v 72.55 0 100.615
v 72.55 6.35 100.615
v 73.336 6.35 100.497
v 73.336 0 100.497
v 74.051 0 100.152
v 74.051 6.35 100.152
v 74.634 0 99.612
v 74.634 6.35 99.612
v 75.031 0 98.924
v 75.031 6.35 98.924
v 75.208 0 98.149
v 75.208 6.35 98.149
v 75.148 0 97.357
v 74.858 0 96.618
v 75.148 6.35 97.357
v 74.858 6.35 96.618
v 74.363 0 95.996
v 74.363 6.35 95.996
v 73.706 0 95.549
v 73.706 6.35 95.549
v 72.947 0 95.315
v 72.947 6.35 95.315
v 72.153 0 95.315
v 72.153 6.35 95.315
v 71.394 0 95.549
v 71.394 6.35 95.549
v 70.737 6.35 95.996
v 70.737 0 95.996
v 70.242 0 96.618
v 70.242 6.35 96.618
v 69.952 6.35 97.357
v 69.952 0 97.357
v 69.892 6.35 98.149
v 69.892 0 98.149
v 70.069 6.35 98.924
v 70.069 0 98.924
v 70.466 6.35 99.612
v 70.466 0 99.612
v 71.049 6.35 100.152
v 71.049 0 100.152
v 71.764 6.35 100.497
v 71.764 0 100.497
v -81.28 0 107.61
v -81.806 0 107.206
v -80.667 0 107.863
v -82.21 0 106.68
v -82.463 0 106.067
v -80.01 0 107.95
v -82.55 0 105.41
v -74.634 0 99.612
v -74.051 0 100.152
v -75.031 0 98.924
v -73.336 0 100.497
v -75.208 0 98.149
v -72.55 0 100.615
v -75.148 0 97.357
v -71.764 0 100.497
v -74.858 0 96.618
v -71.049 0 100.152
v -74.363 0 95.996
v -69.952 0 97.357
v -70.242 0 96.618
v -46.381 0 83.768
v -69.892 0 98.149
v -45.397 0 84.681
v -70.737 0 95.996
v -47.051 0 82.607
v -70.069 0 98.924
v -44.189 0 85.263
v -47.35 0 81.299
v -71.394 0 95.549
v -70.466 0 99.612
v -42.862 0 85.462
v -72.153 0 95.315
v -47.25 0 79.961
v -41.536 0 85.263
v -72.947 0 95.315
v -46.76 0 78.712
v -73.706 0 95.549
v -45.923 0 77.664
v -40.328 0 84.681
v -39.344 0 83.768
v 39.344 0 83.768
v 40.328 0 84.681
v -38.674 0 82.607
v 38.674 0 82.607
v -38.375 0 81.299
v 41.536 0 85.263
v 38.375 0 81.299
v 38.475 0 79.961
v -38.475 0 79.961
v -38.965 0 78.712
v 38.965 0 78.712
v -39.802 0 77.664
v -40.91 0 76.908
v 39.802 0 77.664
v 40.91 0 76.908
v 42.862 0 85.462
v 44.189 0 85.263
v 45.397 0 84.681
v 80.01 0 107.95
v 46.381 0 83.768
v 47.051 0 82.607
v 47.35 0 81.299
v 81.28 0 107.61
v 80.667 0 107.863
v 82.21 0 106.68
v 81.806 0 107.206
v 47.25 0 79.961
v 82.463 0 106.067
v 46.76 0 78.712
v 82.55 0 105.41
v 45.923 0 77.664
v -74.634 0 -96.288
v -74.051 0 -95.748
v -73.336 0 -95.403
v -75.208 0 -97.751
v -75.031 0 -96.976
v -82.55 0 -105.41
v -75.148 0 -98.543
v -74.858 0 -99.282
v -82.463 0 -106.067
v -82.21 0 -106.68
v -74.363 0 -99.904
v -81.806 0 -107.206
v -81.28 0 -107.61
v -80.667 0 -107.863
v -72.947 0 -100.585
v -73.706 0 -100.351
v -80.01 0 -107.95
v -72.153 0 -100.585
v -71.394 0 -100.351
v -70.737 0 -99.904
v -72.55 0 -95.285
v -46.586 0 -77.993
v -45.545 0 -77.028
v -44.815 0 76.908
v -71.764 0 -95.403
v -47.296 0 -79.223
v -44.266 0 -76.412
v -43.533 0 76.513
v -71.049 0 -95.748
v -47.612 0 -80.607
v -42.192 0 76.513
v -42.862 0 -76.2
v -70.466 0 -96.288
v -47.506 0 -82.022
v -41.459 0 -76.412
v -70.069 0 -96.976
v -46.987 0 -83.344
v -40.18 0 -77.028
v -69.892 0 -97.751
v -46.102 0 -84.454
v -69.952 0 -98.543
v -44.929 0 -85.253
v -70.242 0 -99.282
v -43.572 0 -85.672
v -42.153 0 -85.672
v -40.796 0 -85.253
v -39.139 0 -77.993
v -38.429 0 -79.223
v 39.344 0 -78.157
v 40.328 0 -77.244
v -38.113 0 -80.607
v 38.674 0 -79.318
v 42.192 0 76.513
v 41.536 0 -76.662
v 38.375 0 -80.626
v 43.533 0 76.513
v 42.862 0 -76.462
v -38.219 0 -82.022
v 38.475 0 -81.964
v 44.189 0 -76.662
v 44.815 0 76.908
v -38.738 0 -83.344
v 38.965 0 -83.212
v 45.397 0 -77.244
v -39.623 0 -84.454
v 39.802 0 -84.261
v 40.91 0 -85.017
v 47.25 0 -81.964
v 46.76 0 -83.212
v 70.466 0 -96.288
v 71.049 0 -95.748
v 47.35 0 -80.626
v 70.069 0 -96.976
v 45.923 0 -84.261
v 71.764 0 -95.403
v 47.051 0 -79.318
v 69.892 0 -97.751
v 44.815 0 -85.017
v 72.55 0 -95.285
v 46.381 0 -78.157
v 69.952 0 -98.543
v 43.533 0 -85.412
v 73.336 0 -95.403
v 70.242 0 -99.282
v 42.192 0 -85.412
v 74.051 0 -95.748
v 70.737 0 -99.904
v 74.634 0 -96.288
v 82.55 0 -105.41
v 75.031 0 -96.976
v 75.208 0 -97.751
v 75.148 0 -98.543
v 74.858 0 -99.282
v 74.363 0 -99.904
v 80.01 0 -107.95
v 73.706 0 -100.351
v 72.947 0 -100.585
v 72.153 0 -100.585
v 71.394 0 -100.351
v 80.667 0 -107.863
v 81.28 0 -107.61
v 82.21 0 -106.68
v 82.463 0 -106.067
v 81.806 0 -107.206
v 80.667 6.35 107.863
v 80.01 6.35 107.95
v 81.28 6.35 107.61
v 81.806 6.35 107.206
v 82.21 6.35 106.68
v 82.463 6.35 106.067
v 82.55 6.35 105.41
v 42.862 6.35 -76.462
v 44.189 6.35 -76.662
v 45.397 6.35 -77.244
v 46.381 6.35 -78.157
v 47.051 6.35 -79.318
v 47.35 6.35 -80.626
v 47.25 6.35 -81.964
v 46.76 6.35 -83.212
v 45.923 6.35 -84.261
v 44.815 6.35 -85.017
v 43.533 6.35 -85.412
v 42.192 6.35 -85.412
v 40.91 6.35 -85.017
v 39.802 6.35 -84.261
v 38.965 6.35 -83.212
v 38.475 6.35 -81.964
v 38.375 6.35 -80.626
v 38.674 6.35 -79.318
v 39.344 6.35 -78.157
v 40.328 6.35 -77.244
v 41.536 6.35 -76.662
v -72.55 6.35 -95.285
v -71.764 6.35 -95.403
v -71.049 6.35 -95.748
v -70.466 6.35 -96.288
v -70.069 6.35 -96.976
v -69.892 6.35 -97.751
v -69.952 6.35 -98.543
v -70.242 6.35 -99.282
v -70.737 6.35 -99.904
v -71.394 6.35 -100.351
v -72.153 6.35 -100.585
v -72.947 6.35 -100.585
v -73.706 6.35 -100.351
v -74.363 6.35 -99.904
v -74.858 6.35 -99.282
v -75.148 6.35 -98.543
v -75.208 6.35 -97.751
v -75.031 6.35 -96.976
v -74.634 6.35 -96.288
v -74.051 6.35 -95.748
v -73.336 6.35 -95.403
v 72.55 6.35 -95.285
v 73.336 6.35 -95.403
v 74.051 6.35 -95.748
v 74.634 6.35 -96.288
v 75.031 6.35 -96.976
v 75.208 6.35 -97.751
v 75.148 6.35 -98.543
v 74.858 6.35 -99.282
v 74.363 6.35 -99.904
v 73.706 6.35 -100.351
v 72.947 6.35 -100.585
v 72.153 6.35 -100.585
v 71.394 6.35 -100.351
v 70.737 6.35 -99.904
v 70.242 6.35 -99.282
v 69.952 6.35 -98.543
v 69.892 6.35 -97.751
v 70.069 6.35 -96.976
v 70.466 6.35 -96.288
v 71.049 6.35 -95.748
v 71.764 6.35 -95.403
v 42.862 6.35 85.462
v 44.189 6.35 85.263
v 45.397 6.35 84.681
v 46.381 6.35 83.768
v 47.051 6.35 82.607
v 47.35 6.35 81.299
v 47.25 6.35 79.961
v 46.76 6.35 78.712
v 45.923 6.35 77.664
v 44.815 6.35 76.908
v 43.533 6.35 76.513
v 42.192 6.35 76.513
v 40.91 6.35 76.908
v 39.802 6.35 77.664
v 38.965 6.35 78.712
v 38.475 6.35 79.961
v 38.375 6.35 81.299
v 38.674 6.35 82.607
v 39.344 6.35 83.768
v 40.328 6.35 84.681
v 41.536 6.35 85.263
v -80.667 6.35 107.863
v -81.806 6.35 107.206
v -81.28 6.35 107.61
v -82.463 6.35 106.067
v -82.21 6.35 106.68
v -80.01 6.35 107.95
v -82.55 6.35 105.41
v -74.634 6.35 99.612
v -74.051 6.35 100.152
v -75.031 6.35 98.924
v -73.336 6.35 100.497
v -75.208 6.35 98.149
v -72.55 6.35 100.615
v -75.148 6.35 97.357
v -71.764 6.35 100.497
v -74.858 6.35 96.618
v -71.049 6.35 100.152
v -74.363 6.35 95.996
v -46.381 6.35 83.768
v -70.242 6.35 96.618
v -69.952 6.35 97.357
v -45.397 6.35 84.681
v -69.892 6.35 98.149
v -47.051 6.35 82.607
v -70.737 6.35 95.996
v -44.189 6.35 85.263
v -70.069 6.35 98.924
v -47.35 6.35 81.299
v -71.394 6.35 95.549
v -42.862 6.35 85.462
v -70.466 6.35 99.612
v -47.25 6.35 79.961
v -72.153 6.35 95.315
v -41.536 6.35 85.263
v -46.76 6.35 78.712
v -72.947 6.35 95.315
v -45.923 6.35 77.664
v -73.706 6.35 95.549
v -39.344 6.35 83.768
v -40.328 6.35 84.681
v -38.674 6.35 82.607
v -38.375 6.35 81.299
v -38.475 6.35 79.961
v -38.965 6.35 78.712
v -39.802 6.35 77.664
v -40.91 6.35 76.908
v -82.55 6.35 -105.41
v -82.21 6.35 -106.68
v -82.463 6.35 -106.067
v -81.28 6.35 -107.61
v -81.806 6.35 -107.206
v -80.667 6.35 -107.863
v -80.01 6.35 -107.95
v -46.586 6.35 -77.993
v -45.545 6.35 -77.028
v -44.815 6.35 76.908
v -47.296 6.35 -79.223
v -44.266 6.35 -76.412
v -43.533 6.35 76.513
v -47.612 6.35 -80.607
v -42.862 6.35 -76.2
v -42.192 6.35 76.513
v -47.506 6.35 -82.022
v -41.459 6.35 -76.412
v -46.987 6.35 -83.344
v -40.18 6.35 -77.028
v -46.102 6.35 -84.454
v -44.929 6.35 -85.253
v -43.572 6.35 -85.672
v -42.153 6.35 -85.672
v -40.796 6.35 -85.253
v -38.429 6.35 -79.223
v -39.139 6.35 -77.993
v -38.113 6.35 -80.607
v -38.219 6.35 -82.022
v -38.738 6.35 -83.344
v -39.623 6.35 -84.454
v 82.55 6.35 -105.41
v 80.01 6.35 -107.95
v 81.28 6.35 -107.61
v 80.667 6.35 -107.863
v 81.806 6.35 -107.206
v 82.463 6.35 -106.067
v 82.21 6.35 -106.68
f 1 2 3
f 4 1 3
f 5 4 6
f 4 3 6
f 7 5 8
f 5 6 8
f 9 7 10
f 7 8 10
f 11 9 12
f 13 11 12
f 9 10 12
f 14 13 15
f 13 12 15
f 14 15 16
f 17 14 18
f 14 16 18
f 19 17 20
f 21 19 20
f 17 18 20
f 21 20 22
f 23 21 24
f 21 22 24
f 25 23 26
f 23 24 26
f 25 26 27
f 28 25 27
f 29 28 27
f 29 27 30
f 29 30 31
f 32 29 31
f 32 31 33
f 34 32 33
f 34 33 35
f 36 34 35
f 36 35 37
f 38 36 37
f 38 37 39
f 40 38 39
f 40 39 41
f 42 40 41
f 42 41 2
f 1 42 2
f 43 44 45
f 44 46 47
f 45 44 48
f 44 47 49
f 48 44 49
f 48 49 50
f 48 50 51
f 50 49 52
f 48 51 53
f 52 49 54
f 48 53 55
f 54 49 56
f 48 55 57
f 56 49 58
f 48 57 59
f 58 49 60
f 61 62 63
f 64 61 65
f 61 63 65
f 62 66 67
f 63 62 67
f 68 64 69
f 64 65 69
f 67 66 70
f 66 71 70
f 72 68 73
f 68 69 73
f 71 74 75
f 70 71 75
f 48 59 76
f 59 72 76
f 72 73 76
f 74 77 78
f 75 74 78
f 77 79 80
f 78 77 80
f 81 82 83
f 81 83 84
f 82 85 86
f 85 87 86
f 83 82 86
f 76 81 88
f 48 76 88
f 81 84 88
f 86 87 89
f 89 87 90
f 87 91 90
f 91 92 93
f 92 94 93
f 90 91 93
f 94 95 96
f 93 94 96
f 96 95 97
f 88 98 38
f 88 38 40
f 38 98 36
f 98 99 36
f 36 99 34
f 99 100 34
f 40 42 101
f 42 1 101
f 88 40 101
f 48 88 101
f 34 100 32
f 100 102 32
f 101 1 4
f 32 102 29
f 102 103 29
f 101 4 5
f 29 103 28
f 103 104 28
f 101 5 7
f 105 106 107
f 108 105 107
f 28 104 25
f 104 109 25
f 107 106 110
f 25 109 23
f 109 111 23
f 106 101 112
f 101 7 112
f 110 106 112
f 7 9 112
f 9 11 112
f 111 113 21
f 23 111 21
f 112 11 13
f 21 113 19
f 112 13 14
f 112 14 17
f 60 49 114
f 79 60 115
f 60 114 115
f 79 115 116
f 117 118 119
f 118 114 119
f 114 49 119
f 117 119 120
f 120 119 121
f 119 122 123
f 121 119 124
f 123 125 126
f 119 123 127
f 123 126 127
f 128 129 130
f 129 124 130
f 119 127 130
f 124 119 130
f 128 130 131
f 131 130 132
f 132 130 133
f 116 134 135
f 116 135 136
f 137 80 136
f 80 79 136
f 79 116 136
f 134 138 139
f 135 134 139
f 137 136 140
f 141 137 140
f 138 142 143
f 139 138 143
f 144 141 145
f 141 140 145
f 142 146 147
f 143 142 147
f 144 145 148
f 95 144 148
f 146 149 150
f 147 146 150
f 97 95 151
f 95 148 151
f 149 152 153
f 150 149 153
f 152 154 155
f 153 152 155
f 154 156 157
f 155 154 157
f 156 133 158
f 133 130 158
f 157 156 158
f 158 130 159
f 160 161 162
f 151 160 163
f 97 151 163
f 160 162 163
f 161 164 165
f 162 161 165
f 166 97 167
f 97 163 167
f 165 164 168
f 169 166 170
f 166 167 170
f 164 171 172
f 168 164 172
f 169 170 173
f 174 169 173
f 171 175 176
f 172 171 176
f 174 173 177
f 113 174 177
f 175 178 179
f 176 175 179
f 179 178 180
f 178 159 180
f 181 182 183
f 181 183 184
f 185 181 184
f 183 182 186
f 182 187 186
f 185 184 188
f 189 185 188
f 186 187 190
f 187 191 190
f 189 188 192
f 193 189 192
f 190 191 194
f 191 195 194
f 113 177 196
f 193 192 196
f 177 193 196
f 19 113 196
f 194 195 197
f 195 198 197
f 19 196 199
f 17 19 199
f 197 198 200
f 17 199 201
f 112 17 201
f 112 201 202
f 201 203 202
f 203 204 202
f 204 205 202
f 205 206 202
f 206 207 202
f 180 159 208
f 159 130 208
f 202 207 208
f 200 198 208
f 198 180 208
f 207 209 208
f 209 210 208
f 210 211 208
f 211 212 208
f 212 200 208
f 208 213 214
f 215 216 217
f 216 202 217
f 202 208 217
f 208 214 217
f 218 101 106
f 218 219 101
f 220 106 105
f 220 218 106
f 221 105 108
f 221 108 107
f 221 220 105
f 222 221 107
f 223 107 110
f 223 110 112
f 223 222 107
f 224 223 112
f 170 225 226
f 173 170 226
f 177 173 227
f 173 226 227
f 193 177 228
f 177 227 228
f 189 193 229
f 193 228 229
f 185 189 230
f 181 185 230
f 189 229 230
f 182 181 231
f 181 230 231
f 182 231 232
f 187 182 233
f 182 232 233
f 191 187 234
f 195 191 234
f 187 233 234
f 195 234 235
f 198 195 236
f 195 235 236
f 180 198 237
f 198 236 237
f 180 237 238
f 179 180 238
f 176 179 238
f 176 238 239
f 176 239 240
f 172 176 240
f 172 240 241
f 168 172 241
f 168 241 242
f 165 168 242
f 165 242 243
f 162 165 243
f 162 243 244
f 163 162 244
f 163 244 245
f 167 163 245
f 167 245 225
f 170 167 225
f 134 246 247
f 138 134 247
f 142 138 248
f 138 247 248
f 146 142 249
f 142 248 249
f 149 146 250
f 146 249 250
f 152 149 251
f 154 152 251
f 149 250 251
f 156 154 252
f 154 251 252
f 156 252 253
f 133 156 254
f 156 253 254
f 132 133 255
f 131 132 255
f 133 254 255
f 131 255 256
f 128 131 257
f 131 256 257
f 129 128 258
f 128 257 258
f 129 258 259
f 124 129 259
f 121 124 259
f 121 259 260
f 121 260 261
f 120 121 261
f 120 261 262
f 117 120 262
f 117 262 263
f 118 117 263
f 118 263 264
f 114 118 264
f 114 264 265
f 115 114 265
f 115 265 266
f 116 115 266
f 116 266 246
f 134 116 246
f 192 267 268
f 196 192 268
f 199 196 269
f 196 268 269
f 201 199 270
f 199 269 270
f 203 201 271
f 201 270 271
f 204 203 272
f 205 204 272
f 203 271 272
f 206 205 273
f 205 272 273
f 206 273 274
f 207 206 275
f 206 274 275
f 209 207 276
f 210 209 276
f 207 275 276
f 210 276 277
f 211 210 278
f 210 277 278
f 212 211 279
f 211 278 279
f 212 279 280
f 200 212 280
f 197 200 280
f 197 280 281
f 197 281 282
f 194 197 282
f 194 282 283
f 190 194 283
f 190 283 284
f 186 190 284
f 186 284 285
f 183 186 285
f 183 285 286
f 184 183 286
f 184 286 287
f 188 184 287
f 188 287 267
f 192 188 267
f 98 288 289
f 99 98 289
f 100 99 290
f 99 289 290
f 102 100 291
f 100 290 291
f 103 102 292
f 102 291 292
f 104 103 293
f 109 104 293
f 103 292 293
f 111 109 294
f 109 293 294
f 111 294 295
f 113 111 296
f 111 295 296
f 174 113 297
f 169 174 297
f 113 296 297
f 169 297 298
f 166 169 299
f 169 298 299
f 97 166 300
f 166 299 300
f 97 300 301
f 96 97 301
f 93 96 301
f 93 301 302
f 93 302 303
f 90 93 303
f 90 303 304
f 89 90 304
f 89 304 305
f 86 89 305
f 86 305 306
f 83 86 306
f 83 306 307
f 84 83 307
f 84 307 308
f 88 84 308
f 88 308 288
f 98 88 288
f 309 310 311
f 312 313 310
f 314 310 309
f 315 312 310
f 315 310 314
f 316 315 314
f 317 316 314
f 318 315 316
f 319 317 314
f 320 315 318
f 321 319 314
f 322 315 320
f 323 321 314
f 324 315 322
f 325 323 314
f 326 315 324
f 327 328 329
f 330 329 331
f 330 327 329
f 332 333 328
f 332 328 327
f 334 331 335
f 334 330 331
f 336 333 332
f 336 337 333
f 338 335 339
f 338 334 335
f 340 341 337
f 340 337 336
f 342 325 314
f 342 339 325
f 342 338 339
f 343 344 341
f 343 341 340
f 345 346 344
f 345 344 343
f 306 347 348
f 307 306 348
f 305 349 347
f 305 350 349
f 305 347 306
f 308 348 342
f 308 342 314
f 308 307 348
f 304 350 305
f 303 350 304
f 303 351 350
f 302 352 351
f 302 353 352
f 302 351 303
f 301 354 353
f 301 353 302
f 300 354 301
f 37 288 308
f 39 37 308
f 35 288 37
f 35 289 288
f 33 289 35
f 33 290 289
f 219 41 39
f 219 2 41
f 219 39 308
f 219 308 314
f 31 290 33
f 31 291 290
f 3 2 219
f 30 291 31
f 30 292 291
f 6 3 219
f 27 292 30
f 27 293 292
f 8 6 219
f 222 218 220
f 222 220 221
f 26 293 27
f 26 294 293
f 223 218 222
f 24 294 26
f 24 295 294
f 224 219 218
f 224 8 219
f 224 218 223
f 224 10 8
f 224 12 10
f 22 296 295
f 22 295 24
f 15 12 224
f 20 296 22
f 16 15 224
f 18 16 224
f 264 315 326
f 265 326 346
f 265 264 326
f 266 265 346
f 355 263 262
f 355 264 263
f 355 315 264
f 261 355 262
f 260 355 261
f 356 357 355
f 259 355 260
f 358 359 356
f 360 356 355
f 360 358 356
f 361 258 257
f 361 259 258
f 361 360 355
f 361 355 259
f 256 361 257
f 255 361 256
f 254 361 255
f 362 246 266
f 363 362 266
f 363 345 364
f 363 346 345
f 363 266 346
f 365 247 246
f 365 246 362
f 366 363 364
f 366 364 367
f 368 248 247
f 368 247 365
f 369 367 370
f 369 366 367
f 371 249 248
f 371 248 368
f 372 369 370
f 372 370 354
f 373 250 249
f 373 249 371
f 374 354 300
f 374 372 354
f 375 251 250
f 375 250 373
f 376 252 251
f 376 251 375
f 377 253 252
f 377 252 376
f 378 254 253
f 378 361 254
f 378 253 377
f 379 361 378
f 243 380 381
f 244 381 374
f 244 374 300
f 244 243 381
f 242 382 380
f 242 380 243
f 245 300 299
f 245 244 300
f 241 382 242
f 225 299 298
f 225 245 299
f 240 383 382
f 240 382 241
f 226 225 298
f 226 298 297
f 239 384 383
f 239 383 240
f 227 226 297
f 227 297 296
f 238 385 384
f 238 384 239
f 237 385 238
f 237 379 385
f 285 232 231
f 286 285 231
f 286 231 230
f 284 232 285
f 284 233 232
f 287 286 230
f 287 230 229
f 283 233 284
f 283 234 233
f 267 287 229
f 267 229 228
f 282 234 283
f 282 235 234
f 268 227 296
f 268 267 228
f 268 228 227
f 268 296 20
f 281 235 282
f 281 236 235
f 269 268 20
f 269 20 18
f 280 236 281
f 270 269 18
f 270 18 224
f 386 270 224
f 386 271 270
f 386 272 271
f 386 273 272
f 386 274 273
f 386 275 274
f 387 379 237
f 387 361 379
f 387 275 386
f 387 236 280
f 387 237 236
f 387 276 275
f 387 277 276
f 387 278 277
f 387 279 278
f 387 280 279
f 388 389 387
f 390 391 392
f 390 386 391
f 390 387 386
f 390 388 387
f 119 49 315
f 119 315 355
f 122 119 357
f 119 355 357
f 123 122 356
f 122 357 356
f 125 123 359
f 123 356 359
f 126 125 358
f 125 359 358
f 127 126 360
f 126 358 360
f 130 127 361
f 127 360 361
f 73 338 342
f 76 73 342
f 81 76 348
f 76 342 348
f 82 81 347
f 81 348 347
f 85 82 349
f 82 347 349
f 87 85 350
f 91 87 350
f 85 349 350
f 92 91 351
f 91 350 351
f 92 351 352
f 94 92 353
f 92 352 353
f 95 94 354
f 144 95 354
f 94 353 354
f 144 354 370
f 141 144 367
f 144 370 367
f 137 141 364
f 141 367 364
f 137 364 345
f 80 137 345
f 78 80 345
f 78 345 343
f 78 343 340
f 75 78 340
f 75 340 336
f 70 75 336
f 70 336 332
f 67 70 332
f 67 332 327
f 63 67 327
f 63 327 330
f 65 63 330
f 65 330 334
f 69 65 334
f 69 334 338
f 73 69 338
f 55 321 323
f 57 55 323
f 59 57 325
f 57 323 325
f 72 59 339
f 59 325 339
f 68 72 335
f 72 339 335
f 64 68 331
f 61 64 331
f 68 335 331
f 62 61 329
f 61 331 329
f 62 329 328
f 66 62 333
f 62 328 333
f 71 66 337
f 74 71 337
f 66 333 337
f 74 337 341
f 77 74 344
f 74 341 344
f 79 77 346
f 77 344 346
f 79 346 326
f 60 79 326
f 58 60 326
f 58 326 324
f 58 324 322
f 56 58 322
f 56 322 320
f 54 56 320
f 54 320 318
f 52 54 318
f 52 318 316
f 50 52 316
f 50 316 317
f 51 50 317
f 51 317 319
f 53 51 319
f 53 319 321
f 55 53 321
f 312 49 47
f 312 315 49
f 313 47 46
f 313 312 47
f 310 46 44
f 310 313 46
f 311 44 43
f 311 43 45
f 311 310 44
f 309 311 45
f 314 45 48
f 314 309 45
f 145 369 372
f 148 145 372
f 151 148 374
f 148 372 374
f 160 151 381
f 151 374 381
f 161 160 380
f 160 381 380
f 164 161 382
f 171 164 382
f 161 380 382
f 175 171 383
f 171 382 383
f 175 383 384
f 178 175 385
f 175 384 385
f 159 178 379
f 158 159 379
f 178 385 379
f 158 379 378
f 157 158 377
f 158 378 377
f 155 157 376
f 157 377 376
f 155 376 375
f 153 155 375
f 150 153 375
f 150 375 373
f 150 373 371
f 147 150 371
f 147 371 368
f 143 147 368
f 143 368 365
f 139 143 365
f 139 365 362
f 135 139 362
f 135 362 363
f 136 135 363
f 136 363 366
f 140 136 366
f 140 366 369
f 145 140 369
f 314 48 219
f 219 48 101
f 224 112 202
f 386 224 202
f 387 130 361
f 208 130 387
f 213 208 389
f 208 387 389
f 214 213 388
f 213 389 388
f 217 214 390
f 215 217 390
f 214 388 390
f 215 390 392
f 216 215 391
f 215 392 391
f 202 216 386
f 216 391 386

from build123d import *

# Parameters (mm, degrees)
SKETCH1_W           = 165.1
SKETCH1_H           = 215.9
BOSS_EXTRUDE1_DEPTH = 6.35
CUT_EXTRUDE2_REACH  = 138.044
SKETCH3_R           = 2.665
FILLET1_R           = 2.54
CUT_EXTRUDE3_REACH  = 138.044
SKETCH2_R           = 4.7625
SKETCH2_R_2         = 4.5


with BuildPart() as part:
    # Sketch1 → Boss-Extrude1 (new body)
    with BuildSketch(Plane(origin=(0, 0, 0), x_dir=(1, 0, 0), z_dir=(0, 1, 0))):
        Rectangle(SKETCH1_W, SKETCH1_H)
    extrude(amount=BOSS_EXTRUDE1_DEPTH)

    # Sketch3 → Cut-Extrude2 (cut, up to next)
    with BuildSketch(Plane(origin=(0, 6.35, 0), x_dir=(-1, 0, 0), z_dir=(0, 1, 0)), mode=Mode.PRIVATE) as cut_extrude2_sk1:
        with Locations(Location((72.55, 97.95, 0), (0, 0, 90))):
            Circle(SKETCH3_R)
    cut_extrude2_tool1 = extrude(cut_extrude2_sk1.sketch, amount=-CUT_EXTRUDE2_REACH, mode=Mode.PRIVATE) & part.part
    # Sketch3 → Cut-Extrude2 (cut, up to next)
    with BuildSketch(Plane(origin=(0, 6.35, 0), x_dir=(-1, 0, 0), z_dir=(0, 1, 0)), mode=Mode.PRIVATE) as cut_extrude2_sk2:
        with Locations(Location((-72.55, 97.95, 0), (0, 0, 90))):
            Circle(SKETCH3_R)
    cut_extrude2_tool2 = extrude(cut_extrude2_sk2.sketch, amount=-CUT_EXTRUDE2_REACH, mode=Mode.PRIVATE) & part.part
    # Sketch3 → Cut-Extrude2 (cut, up to next)
    with BuildSketch(Plane(origin=(0, 6.35, 0), x_dir=(-1, 0, 0), z_dir=(0, 1, 0)), mode=Mode.PRIVATE) as cut_extrude2_sk3:
        with Locations(Location((-72.55, -97.95, 0), (0, 0, 90))):
            Circle(SKETCH3_R)
    cut_extrude2_tool3 = extrude(cut_extrude2_sk3.sketch, amount=-CUT_EXTRUDE2_REACH, mode=Mode.PRIVATE) & part.part
    # Sketch3 → Cut-Extrude2 (cut, up to next)
    with BuildSketch(Plane(origin=(0, 6.35, 0), x_dir=(-1, 0, 0), z_dir=(0, 1, 0)), mode=Mode.PRIVATE) as cut_extrude2_sk4:
        with Locations(Location((72.55, -97.95, 0), (0, 0, 90))):
            Circle(SKETCH3_R)
    cut_extrude2_tool4 = extrude(cut_extrude2_sk4.sketch, amount=-CUT_EXTRUDE2_REACH, mode=Mode.PRIVATE) & part.part
    add(cut_extrude2_tool1.solids().sort_by_distance((-72.55, 6.35, 97.95))[0], mode=Mode.SUBTRACT)
    add(cut_extrude2_tool2.solids().sort_by_distance((72.55, 6.35, 97.95))[0], mode=Mode.SUBTRACT)
    add(cut_extrude2_tool3.solids().sort_by_distance((72.55, 6.35, -97.95))[0], mode=Mode.SUBTRACT)
    add(cut_extrude2_tool4.solids().sort_by_distance((-72.55, 6.35, -97.95))[0], mode=Mode.SUBTRACT)

    # Fillet1
    fillet1_edges = [part.edges().sort_by_distance(p)[0] for p in [
        (-82.55, 3.175, -107.95),
        (82.55, 3.175, -107.95),
        (82.55, 3.175, 107.95),
        (-82.55, 3.175, 107.95),
    ]]
    fillet(fillet1_edges, radius=FILLET1_R)

    # Sketch2 → Cut-Extrude3 (cut, up to next)
    with BuildSketch(Plane(origin=(0, 6.35, 0), x_dir=(1, 0, 0), z_dir=(0, 1, 0)), mode=Mode.PRIVATE) as cut_extrude3_sk1:
        with Locations(Location((-42.8625, 80.9625, 0), (0, 0, 270))):
            Circle(SKETCH2_R)
    cut_extrude3_tool1 = extrude(cut_extrude3_sk1.sketch, amount=-CUT_EXTRUDE3_REACH, mode=Mode.PRIVATE) & part.part
    # Sketch2 → Cut-Extrude3 (cut, up to next)
    with BuildSketch(Plane(origin=(0, 6.35, 0), x_dir=(1, 0, 0), z_dir=(0, 1, 0)), mode=Mode.PRIVATE) as cut_extrude3_sk2:
        with Locations(Location((-42.8625, -80.9625, 0), (0, 0, 270))):
            Circle(SKETCH2_R_2)
    cut_extrude3_tool2 = extrude(cut_extrude3_sk2.sketch, amount=-CUT_EXTRUDE3_REACH, mode=Mode.PRIVATE) & part.part
    # Sketch2 → Cut-Extrude3 (cut, up to next)
    with BuildSketch(Plane(origin=(0, 6.35, 0), x_dir=(1, 0, 0), z_dir=(0, 1, 0)), mode=Mode.PRIVATE) as cut_extrude3_sk3:
        with Locations(Location((42.8625, -80.9625, 0), (0, 0, 270))):
            Circle(SKETCH2_R_2)
    cut_extrude3_tool3 = extrude(cut_extrude3_sk3.sketch, amount=-CUT_EXTRUDE3_REACH, mode=Mode.PRIVATE) & part.part
    # Sketch2 → Cut-Extrude3 (cut, up to next)
    with BuildSketch(Plane(origin=(0, 6.35, 0), x_dir=(1, 0, 0), z_dir=(0, 1, 0)), mode=Mode.PRIVATE) as cut_extrude3_sk4:
        with Locations(Location((42.8625, 80.9625, 0), (0, 0, 270))):
            Circle(SKETCH2_R_2)
    cut_extrude3_tool4 = extrude(cut_extrude3_sk4.sketch, amount=-CUT_EXTRUDE3_REACH, mode=Mode.PRIVATE) & part.part
    add(cut_extrude3_tool1.solids().sort_by_distance((-42.8625, 6.35, -80.9625))[0], mode=Mode.SUBTRACT)
    add(cut_extrude3_tool2.solids().sort_by_distance((-42.8625, 6.35, 80.9625))[0], mode=Mode.SUBTRACT)
    add(cut_extrude3_tool3.solids().sort_by_distance((42.8625, 6.35, 80.9625))[0], mode=Mode.SUBTRACT)
    add(cut_extrude3_tool4.solids().sort_by_distance((42.8625, 6.35, -80.9625))[0], mode=Mode.SUBTRACT)


solid = part.part
